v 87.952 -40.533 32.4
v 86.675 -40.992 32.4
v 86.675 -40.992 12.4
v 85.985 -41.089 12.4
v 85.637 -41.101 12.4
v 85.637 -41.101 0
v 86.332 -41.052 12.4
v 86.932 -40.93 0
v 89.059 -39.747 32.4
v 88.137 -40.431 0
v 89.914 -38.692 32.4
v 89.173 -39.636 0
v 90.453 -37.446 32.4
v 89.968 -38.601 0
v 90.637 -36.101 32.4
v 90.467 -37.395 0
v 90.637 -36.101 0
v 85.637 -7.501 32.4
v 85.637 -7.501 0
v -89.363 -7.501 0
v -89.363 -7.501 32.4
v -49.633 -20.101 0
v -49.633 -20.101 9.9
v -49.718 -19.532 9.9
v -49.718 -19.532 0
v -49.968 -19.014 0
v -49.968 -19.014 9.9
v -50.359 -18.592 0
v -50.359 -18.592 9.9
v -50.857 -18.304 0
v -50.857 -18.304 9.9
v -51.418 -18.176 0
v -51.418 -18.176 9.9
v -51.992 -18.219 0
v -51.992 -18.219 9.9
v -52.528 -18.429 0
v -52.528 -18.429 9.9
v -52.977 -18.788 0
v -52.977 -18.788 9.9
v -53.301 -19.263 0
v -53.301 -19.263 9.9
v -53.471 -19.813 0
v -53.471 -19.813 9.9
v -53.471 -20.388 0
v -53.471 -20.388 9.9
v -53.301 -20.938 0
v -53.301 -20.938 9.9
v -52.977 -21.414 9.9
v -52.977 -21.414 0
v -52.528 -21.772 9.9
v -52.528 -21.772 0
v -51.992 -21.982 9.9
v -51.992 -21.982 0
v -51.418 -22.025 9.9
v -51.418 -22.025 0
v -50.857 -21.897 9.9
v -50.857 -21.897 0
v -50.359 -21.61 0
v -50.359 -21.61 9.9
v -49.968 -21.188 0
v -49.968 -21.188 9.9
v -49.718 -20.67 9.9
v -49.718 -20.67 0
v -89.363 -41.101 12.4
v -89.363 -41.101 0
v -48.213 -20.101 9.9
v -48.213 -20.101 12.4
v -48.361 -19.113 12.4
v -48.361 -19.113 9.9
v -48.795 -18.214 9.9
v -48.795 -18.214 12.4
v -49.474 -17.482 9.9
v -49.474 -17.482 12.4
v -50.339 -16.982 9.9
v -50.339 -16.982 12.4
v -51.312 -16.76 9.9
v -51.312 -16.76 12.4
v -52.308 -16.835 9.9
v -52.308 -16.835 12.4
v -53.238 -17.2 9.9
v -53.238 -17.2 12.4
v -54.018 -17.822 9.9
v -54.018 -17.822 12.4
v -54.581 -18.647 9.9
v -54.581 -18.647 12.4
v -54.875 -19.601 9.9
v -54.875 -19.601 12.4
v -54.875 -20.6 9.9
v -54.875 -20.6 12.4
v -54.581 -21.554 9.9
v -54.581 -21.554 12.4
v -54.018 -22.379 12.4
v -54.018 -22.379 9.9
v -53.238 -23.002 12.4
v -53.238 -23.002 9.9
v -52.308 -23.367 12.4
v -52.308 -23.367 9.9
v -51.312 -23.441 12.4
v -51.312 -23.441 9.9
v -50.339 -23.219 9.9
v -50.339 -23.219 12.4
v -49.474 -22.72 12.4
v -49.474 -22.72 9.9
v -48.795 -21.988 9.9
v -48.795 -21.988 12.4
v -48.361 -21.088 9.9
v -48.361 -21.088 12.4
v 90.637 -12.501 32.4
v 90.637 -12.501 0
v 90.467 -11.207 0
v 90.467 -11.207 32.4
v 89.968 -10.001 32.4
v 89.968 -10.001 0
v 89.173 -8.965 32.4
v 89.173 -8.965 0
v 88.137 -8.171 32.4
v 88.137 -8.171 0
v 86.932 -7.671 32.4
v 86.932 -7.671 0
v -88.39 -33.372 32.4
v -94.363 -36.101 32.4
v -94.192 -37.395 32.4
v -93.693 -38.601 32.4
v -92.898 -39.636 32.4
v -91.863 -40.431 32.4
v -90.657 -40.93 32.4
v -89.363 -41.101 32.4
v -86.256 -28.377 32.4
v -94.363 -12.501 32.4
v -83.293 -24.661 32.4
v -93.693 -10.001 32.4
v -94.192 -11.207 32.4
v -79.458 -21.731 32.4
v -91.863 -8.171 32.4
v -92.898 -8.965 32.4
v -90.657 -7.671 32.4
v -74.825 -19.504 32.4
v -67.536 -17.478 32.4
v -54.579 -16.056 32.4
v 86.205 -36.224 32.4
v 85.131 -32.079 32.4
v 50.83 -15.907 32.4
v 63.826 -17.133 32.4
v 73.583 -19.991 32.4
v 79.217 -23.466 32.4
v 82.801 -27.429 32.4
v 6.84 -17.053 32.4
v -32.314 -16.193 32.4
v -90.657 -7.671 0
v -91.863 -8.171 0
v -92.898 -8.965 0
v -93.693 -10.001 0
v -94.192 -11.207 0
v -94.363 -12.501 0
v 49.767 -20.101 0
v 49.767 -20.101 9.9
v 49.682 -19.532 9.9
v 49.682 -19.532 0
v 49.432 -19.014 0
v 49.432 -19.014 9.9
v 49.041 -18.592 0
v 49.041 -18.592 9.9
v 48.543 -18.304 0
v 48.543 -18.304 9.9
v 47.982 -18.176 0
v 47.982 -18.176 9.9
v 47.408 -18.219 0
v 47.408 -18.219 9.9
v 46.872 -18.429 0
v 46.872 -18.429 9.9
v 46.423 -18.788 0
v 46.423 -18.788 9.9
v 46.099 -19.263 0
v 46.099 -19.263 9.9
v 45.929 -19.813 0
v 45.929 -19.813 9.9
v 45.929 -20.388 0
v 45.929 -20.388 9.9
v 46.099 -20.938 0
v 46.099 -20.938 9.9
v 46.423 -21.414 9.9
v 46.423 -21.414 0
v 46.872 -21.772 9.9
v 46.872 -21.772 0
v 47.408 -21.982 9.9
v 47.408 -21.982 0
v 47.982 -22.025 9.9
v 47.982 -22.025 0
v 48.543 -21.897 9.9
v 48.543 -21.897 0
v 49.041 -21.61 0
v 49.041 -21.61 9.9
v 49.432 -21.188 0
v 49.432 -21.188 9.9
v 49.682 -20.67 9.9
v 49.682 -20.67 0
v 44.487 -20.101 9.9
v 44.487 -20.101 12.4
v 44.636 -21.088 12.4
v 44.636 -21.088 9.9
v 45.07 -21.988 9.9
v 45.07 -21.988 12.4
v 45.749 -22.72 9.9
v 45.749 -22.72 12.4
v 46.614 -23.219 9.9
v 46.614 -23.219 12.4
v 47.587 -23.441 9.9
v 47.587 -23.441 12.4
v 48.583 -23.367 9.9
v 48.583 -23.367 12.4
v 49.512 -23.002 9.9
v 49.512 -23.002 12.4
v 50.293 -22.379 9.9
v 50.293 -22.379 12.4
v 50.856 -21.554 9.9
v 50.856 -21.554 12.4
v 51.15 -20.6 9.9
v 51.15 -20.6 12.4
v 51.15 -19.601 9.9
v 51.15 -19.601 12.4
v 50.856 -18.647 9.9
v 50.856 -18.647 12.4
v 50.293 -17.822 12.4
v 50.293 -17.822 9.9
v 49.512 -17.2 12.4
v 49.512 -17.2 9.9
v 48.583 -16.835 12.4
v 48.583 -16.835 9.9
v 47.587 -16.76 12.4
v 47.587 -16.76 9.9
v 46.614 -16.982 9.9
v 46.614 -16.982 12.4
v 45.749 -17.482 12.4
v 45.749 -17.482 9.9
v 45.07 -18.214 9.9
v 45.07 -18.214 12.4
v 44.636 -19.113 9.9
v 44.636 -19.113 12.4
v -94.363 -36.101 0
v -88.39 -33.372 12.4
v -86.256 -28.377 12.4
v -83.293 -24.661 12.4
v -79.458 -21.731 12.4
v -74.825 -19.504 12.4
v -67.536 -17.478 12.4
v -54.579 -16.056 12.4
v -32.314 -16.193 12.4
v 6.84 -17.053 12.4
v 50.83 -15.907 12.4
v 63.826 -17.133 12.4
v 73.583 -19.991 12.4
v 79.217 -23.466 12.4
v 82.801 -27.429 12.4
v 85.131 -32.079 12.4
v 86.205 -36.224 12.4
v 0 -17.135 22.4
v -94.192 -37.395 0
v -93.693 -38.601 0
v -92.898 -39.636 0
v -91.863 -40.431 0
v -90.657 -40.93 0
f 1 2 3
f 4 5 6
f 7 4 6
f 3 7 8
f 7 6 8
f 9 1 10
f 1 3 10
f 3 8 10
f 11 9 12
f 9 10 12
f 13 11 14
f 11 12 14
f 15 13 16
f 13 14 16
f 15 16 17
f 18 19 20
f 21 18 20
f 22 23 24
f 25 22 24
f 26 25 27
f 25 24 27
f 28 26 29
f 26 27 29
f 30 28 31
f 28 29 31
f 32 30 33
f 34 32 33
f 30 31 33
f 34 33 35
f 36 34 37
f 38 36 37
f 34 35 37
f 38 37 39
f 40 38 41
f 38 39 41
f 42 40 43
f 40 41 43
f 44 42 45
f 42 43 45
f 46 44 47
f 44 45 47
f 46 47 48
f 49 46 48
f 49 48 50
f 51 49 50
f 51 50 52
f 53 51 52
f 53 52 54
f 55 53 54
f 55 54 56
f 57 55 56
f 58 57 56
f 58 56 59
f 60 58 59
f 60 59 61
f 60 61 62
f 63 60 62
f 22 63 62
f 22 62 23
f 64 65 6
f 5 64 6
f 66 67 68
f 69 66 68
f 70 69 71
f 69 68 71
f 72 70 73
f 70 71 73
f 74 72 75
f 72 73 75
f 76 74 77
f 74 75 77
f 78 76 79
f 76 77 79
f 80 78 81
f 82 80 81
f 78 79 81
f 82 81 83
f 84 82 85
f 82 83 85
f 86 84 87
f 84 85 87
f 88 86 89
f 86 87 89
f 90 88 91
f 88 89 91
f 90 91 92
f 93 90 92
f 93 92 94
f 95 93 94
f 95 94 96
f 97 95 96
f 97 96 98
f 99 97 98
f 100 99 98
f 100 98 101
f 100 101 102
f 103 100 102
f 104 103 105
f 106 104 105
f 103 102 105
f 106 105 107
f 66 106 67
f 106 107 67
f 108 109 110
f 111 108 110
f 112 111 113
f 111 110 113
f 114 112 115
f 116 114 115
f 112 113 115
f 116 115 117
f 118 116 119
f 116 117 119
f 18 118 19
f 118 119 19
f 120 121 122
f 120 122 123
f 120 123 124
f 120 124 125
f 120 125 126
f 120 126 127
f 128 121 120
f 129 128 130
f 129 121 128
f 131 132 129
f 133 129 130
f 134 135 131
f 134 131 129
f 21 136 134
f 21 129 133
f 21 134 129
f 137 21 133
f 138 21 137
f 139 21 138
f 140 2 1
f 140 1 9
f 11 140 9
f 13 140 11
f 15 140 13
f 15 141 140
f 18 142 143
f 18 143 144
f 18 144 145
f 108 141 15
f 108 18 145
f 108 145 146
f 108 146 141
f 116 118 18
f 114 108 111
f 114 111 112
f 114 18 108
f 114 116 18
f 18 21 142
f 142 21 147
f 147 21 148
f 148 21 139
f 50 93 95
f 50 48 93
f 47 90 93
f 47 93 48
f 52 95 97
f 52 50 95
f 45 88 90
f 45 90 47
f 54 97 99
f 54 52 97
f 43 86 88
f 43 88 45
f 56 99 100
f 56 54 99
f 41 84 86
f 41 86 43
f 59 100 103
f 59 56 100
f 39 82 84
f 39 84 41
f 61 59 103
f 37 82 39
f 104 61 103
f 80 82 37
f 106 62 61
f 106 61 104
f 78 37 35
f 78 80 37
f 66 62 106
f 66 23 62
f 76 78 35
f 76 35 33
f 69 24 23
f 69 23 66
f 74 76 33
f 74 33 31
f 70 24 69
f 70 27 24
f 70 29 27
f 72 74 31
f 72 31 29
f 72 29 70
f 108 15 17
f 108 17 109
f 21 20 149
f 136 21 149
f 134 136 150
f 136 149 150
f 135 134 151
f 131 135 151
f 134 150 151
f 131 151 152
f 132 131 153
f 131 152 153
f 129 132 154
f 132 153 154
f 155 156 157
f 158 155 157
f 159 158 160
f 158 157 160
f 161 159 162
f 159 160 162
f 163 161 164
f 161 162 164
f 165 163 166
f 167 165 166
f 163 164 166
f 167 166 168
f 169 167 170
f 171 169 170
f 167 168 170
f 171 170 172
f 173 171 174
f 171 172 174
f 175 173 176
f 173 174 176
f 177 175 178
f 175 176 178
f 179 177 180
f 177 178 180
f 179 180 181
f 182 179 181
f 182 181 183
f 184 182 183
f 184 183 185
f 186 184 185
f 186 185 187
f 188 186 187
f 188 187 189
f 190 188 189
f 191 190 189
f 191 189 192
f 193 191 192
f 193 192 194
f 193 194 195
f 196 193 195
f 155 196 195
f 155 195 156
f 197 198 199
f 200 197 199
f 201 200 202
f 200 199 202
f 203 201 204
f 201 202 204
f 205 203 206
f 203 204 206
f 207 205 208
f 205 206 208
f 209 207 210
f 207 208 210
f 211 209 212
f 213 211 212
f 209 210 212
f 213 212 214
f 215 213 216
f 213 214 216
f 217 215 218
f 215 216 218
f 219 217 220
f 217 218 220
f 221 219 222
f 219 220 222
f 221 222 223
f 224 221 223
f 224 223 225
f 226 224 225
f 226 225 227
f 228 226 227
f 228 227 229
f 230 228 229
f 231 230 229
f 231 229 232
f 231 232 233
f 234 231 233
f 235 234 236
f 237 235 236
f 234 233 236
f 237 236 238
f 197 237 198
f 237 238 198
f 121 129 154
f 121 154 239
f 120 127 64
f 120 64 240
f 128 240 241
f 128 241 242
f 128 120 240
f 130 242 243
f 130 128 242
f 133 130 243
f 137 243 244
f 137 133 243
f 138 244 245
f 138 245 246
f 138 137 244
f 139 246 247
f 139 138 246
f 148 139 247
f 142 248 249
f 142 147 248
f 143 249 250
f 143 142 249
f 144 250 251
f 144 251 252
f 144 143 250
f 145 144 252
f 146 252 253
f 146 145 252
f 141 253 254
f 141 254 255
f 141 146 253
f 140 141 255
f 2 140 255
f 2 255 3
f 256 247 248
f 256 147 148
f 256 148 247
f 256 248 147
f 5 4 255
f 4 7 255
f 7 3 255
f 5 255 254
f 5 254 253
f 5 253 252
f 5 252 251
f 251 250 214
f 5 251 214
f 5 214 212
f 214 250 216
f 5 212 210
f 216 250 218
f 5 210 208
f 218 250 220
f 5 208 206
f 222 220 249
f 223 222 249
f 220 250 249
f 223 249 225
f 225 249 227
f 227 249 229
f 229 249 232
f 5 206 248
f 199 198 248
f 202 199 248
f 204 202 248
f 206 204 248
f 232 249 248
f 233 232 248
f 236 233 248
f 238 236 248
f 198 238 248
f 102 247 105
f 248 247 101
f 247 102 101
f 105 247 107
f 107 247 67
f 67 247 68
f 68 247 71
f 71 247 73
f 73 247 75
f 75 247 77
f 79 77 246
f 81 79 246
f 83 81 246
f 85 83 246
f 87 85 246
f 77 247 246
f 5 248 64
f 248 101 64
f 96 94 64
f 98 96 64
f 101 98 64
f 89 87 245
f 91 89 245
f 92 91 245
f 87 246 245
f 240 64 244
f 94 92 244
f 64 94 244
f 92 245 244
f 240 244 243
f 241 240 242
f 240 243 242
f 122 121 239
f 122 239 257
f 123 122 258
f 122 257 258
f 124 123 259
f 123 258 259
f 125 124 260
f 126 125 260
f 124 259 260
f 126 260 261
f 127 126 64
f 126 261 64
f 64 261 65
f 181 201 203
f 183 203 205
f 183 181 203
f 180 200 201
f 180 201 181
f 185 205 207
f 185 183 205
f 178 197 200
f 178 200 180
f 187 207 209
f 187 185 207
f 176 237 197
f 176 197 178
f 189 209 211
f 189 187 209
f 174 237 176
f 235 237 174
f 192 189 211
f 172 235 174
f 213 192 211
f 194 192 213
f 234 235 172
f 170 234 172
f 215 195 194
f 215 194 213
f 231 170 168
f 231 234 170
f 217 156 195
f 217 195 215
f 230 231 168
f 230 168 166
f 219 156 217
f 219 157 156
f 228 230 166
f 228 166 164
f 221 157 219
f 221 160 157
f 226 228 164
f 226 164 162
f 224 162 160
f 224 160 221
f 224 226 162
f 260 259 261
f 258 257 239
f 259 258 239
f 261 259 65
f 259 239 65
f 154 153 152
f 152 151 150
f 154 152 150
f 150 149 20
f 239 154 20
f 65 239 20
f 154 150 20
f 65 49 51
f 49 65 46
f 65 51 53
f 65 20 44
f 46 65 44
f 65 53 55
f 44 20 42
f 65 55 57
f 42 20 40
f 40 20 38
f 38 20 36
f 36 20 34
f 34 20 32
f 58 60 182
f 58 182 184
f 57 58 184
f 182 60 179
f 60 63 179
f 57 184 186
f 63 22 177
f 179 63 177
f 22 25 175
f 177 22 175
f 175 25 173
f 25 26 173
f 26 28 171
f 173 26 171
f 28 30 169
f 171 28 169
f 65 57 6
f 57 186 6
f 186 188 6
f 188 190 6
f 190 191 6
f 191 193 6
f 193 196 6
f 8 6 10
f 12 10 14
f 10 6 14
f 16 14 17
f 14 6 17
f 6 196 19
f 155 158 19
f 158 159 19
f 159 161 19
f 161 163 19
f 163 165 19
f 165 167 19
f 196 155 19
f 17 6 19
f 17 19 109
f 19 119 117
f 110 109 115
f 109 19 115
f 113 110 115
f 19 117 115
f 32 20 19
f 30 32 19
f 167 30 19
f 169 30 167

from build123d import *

# Parameters (mm, degrees)
F1_DEPTH = 32.4
F3_DEPTH = 20
F4_R     = 3.35
F5_DEPTH = 2.5
F6_R     = 1.93
F7_DEPTH = 25
F8_R     = 1.93
F9_DEPTH = 25


# Not quite as in the source:
# - a feature names something its author has since deleted; it is built from what else it names


with BuildPart() as f1:
    # F0 (on Top) → F1 (new body)
    with BuildSketch(Plane.XY):
        with BuildLine():
            Line((85.6374964118, -7.5007802074), (-89.3625035882, -7.5007802074))
            ThreePointArc((-89.3625035882, -7.5007802074), (-92.8980374941, -8.9652463014), (-94.3625035882, -12.5007802074))
            Line((-94.3625035882, -12.5007802074), (-94.3625035882, -36.1007802074))
            ThreePointArc((-94.3625035882, -36.1007802074), (-92.8980374941, -39.6363141133), (-89.3625035882, -41.1007802074))
            add(Edge.make_bspline(
                [(-89.3625035882, -41.1007802074), (-59.4269413323, -34.6411043009), (-0.064704069, -1.5309018726), (57.2335608059, -34.7243234216), (85.6374964118, -41.1007802074)],
                knots=[0, 0, 0, 0, 0.5049781057, 1, 1, 1, 1], degree=3))
            ThreePointArc((85.6374964118, -41.1007802074), (89.1730303177, -39.6363141133), (90.6374964118, -36.1007802074))
            Line((90.6374964118, -36.1007802074), (90.6374964118, -12.5007802074))
            ThreePointArc((90.6374964118, -12.5007802074), (89.1730303177, -8.9652463014), (85.6374964118, -7.5007802074))
        make_face()
        with BuildLine():
            add(Edge.make_bspline(
                [(-89.3625035882, -41.1007802074), (-59.4269413323, -34.6411043009), (-0.064704069, -1.5309018726), (57.2335608059, -34.7243234216), (85.6374964118, -41.1007802074)],
                knots=[0, 0, 0, 0, 0.5049781057, 1, 1, 1, 1], degree=3))
            Line((-89.3625035882, -41.1007802074), (85.6374964118, -41.1007802074))
        make_face()
    extrude(amount=F1_DEPTH)

    # F2 (on face) → F3 (cut)
    with BuildSketch(Plane.XY.offset(32.4)):
        with BuildLine():
            add(Edge.make_bspline(
                [(-89.3625035882, -41.1007802074), (-89.3625035882, -7.5007802074), (0.6047339491, -26.7707217669), (85.6374964118, -7.5007802074), (86.6746914089, -40.9920199825)],
                knots=[0, 0, 0, 0, 0.5035939918, 1, 1, 1, 1], degree=3))
            Line((-89.3625035882, -41.1007802074), (85.6374964118, -41.1007802074))
            ThreePointArc((85.6374964118, -41.1007802074), (86.1589372638, -41.0735158165), (86.6746914089, -40.9920199825))
        make_face()
    extrude(amount=-F3_DEPTH, mode=Mode.SUBTRACT)

    # F4 (on face) → F5 (cut)
    with BuildSketch(Plane.XY.offset(12.4)):
        with Locations((-51.5625035882, -20.1007802074)):
            Circle(F4_R)
        with BuildLine():
            ThreePointArc((51.1874964118, -20.1007802074), (47.8374964118, -16.7507802074), (44.4874964118, -20.1007802074))
            ThreePointArc((44.4874964118, -20.1007802074), (47.8374964118, -23.4507802074), (51.1874964118, -20.1007802074))
        make_face()
    extrude(amount=-F5_DEPTH, mode=Mode.SUBTRACT)

    # F6 (on face) → F7 (cut)
    with BuildSketch(Plane.XY.offset(9.9)):
        with Locations((-51.5625035882, -20.1007802074)):
            Circle(F6_R)
    extrude(amount=-F7_DEPTH, mode=Mode.SUBTRACT)

    # F8 (on face) → F9 (cut)
    with BuildSketch(Plane.XY.offset(9.9)):
        with Locations((47.8374964118, -20.1007802074)):
            Circle(F8_R)
    extrude(amount=-F9_DEPTH, mode=Mode.SUBTRACT)


solid = f1.part
